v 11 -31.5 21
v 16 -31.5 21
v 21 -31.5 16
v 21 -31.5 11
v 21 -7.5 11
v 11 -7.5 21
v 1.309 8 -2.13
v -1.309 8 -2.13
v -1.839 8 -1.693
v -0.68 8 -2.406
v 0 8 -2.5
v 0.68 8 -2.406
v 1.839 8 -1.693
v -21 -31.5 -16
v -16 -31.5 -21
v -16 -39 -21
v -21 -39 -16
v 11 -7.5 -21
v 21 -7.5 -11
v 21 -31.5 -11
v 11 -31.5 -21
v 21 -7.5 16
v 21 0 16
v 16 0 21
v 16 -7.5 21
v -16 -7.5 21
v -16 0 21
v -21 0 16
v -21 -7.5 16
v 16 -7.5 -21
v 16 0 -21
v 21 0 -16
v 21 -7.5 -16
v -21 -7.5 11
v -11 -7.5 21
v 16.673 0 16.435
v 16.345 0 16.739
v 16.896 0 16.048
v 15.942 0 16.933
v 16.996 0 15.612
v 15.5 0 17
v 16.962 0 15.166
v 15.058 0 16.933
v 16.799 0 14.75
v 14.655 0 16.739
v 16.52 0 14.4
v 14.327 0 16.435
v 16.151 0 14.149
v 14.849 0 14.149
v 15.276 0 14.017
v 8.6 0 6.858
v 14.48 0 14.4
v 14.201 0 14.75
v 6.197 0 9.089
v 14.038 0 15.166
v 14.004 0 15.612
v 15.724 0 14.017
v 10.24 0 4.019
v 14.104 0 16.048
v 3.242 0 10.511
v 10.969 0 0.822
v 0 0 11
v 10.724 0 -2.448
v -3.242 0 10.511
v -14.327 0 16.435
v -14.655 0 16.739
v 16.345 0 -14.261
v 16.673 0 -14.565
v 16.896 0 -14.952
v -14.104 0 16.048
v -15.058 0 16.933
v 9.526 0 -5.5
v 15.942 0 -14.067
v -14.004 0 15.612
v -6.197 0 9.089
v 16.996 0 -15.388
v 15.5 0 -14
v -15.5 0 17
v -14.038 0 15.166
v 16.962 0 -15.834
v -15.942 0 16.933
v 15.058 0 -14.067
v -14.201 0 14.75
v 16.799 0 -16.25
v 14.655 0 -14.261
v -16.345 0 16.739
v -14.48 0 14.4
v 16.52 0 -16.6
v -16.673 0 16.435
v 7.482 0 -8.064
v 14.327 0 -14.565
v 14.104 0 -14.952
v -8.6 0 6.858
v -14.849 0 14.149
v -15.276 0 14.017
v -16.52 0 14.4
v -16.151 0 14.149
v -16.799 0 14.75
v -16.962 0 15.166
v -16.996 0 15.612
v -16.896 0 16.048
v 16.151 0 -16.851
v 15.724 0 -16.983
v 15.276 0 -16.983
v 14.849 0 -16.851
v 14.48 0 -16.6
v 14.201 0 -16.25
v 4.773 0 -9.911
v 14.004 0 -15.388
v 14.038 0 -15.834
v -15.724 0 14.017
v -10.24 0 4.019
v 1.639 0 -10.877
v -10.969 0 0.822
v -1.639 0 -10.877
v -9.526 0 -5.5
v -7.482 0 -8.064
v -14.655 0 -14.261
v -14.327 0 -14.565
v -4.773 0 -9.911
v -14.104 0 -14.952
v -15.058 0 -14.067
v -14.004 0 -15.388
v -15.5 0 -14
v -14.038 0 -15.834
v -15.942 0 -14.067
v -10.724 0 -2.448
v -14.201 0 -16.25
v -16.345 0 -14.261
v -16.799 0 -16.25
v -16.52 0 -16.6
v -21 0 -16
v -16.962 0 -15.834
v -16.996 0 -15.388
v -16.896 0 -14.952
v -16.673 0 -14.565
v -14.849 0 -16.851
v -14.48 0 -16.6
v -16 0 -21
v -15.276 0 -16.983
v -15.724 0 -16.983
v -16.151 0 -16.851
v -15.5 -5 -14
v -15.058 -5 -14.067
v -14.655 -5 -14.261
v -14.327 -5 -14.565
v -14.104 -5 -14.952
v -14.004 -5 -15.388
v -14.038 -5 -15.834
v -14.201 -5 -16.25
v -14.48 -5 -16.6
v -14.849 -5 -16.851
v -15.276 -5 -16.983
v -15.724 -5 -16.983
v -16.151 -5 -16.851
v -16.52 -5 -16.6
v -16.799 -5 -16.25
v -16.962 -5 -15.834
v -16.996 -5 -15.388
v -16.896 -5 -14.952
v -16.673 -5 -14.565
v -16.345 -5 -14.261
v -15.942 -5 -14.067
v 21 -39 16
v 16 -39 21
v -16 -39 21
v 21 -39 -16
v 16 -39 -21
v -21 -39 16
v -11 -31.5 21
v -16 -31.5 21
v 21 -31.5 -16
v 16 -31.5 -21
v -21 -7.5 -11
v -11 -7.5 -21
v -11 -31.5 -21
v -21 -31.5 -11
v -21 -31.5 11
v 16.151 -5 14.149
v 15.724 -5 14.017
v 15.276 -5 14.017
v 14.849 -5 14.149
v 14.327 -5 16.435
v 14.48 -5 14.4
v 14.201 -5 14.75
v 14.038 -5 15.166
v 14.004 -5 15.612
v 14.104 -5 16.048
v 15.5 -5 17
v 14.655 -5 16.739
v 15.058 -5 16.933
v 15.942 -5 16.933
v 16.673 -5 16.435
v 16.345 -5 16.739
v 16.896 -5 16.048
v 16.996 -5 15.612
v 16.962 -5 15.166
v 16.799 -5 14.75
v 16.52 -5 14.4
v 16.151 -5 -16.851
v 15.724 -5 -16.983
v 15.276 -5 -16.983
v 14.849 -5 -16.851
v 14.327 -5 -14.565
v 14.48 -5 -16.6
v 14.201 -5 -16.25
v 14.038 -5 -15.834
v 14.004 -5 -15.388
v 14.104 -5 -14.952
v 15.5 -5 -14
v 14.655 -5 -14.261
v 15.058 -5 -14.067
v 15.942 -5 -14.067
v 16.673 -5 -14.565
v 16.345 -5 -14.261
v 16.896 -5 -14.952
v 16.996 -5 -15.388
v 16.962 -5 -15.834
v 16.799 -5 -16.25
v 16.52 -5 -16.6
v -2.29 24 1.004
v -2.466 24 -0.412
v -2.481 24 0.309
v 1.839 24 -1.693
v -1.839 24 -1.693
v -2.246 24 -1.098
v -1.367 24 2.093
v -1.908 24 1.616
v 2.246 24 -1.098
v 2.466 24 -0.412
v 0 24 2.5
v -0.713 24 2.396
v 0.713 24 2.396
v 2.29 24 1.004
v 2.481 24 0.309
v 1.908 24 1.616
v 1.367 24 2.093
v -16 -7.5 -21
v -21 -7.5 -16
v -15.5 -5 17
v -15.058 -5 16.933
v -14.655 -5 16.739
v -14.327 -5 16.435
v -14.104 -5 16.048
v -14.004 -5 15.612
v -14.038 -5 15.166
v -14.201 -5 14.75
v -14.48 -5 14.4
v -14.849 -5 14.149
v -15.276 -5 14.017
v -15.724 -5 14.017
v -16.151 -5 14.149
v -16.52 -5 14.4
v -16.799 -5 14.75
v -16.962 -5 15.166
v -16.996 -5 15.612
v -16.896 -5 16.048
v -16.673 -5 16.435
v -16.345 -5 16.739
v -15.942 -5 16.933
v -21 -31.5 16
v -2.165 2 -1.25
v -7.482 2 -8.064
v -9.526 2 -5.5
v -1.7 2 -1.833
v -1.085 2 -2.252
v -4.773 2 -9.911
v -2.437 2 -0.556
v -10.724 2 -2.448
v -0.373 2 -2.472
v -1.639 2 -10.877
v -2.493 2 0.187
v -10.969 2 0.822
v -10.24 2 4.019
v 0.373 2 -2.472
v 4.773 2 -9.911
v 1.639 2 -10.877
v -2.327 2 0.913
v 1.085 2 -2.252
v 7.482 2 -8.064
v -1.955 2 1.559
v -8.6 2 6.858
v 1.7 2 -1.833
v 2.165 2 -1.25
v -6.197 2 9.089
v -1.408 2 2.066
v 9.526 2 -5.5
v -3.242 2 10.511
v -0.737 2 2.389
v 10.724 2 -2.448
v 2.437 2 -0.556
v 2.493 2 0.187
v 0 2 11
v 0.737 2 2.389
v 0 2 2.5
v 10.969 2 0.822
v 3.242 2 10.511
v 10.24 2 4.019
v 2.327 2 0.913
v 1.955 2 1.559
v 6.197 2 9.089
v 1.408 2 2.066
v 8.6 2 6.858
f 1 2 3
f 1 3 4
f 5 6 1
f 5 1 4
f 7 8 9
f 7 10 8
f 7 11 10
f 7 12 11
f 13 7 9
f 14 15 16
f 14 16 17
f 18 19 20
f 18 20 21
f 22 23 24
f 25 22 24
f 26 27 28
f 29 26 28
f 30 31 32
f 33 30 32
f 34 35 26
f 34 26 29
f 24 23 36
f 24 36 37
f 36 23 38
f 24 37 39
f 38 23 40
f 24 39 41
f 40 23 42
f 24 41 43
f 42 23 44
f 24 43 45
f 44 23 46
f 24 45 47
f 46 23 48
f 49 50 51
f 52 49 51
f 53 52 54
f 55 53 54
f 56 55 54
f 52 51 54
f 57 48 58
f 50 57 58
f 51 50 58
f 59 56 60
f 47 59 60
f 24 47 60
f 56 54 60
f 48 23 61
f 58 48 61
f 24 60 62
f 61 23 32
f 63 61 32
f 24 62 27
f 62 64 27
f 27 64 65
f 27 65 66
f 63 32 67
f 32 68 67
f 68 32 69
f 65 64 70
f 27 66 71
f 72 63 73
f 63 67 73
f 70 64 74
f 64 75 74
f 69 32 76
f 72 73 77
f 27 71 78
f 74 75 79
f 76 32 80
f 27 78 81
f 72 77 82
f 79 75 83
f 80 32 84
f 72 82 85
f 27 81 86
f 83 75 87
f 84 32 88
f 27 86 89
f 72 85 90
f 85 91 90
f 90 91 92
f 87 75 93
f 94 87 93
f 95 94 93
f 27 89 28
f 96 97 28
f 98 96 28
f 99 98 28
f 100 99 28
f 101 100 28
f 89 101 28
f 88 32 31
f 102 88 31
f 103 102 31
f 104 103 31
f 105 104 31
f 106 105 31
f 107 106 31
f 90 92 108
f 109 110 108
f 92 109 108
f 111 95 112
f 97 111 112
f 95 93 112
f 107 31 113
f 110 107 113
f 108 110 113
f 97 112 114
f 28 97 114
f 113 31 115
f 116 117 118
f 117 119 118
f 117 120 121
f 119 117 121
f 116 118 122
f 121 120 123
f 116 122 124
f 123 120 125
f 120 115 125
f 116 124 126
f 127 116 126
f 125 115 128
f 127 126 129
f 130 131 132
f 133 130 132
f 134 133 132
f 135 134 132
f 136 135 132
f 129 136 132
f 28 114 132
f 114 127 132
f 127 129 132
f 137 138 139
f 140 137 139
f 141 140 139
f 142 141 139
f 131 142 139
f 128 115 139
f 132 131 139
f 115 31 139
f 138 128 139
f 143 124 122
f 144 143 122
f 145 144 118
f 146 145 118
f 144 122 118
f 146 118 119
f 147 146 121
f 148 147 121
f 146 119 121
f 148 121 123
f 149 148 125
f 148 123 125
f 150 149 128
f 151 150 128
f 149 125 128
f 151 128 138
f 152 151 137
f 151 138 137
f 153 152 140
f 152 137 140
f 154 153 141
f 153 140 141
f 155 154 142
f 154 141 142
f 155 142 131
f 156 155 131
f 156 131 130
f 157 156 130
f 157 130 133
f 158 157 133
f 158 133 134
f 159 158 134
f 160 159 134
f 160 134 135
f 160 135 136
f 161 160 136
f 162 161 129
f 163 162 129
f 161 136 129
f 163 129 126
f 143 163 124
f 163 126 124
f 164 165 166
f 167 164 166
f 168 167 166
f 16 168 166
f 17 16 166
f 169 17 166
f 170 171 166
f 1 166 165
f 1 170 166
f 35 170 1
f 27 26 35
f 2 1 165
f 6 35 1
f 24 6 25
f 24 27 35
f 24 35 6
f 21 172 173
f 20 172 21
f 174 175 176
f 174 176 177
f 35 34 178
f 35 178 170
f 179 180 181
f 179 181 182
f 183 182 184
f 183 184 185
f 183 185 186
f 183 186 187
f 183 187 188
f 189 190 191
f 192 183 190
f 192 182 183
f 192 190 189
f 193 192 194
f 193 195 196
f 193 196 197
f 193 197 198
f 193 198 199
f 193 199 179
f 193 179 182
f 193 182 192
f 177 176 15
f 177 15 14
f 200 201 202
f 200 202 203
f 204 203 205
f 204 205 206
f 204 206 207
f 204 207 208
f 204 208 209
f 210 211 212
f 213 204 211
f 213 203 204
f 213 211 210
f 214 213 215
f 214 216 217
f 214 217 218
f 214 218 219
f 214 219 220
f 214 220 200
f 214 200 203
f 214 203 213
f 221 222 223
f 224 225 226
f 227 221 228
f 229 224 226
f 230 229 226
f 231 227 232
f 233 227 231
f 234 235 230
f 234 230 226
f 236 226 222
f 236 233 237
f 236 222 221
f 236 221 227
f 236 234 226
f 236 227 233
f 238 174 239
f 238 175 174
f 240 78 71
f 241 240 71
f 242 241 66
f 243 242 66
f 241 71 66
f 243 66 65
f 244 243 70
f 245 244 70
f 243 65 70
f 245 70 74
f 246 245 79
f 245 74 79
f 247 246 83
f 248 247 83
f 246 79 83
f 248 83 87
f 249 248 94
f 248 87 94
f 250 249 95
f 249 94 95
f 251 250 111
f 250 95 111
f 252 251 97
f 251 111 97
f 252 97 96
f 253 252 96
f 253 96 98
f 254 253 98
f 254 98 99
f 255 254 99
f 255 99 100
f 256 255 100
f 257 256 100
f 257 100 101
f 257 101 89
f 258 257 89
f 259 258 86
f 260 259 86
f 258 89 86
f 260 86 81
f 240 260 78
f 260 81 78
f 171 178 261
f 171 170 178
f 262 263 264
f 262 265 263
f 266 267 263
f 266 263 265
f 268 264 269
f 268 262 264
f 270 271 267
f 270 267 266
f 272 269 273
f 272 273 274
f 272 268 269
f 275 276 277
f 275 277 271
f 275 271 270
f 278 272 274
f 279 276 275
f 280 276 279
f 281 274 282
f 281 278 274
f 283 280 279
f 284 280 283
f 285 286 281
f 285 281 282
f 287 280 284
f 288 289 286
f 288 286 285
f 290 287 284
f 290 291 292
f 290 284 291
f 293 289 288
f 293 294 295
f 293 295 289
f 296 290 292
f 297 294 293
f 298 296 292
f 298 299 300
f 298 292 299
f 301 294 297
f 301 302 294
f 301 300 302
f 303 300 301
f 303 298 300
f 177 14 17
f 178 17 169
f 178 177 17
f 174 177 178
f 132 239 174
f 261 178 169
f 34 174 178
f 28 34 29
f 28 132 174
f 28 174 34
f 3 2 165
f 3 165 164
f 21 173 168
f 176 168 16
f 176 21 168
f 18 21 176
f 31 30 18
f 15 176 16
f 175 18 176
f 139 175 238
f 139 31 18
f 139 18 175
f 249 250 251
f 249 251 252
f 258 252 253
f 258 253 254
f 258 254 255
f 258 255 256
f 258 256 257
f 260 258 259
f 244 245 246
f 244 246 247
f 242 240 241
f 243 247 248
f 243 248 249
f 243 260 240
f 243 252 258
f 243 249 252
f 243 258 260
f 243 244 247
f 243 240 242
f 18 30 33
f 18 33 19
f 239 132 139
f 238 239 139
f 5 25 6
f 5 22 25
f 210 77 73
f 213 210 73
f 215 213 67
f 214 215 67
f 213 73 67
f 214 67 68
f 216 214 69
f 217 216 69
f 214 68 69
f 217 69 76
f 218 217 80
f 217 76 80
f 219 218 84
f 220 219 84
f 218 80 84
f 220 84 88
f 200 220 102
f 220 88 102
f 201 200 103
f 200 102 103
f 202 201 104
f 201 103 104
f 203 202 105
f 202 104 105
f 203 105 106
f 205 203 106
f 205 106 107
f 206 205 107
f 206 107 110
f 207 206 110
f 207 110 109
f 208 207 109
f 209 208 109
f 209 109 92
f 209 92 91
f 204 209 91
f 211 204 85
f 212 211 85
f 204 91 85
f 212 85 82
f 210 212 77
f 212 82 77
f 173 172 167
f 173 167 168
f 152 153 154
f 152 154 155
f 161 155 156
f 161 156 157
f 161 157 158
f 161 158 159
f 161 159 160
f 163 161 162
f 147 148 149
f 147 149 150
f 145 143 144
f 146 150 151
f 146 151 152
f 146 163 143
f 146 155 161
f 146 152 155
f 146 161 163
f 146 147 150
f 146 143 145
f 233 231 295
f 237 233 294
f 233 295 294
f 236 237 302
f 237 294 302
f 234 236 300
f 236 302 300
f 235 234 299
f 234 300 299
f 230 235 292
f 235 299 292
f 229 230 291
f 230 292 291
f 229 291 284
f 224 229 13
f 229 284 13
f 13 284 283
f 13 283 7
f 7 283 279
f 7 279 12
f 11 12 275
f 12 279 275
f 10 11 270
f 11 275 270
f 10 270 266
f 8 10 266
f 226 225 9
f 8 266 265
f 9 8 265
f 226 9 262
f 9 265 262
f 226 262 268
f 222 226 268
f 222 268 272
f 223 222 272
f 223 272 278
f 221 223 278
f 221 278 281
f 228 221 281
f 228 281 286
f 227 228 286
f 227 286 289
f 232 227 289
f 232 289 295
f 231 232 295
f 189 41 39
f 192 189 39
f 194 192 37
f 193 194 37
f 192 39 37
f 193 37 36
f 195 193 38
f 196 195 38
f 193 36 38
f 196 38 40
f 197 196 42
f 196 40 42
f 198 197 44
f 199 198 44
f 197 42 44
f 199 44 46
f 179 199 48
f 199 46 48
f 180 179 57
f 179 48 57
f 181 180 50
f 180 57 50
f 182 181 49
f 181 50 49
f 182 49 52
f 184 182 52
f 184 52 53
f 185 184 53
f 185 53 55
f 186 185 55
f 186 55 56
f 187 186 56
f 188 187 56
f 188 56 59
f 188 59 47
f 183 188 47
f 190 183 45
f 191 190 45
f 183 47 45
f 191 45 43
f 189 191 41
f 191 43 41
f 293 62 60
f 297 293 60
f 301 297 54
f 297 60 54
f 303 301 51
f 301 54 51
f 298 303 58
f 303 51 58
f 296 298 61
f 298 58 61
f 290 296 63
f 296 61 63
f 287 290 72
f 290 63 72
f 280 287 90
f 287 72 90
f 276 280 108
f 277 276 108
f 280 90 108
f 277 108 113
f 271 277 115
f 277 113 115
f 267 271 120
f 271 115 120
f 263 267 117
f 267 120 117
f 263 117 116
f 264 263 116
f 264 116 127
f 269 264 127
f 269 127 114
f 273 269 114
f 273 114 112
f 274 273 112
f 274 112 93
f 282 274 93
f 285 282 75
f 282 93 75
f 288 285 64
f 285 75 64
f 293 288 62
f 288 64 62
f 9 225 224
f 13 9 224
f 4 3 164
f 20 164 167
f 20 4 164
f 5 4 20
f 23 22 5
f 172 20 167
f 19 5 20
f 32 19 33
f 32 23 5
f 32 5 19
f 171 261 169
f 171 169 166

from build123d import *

# Parameters (mm, degrees)
EXTRUDE_1_DEPTH     = 7.5
EXTRUDE_2_DEPTH     = 24
EXTRUDE_3_DEPTH     = 7.5
SKETCH_4_R          = 11
EXTRUDE_4_DEPTH     = 2
SKETCH_5_R          = 2.5
EXTRUDE_5_DEPTH     = 22
SKETCH_6_W          = 7.205665958
SKETCH_6_H          = 1.954366946
CUT_EXTRUDE_1_DEPTH = 16
SKETCH_7_R          = 1.5
CUT_EXTRUDE_2_DEPTH = 5


with BuildPart() as part:
    # 草图1 → 凸台-拉伸1 (new body)
    with BuildSketch(Plane(origin=(0, 0, 0), x_dir=(1, 0, 0), z_dir=(0, 1, 0))):
        Polygon((-21, 16), (-16, 21), (16, 21), (21, 16), (21, -16), (16, -21), (-16, -21), (-21, -16), align=None)
    extrude(amount=-EXTRUDE_1_DEPTH)

    # 草图2 → 凸台-拉伸2 (add)
    with BuildSketch(Plane.XZ.offset(7.5)):
        Polygon((-21, 11), (-11, 21), (11, 21), (21, 11), (21, -11), (11, -21), (-11, -21), (-21, -11), align=None)
    extrude(amount=EXTRUDE_2_DEPTH)

    # 草图3 → 凸台-拉伸3 (add)
    with BuildSketch(Plane.XZ.offset(31.5)):
        Polygon((-21, 16), (-16, 21), (16, 21), (21, 16), (21, -16), (16, -21), (-16, -21), (-21, -16), align=None)
    extrude(amount=EXTRUDE_3_DEPTH)

    # 草图4 → 凸台-拉伸4 (add)
    with BuildSketch(Plane(origin=(0, 0, 0), x_dir=(1, 0, 0), z_dir=(0, 1, 0))):
        with Locations(Location((0, 0, 0), (0, 0, 270))):
            Circle(SKETCH_4_R)
    extrude(amount=EXTRUDE_4_DEPTH)

    # 草图5 → 凸台-拉伸5 (add)
    with BuildSketch(Plane(origin=(0, 2, 0), x_dir=(1, 0, 0), z_dir=(0, 1, 0))):
        with Locations(Location((0, 0, 0), (0, 0, 270))):
            Circle(SKETCH_5_R)
    extrude(amount=EXTRUDE_5_DEPTH)

    # 草图6 → 切除-拉伸1 (cut)
    with BuildSketch(Plane(origin=(0, 24, 0), x_dir=(1, 0, 0), z_dir=(0, 1, 0))):
        with Locations((0.108418899, 2.670655674)):
            Rectangle(SKETCH_6_W, SKETCH_6_H)
    extrude(amount=-CUT_EXTRUDE_1_DEPTH, mode=Mode.SUBTRACT)

    # 草图7 → 切除-拉伸2 (cut)
    with BuildSketch(Plane(origin=(0, 0, 0), x_dir=(1, 0, 0), z_dir=(0, 1, 0))):
        with Locations(Location((-15.5, 15.5, 0), (0, 0, 270))):
            Circle(SKETCH_7_R)
        with Locations(Location((15.5, 15.5, 0), (0, 0, 270))):
            Circle(SKETCH_7_R)
        with Locations(Location((15.5, -15.5, 0), (0, 0, 270))):
            Circle(SKETCH_7_R)
        with Locations(Location((-15.5, -15.5, 0), (0, 0, 270))):
            Circle(SKETCH_7_R)
    extrude(amount=-CUT_EXTRUDE_2_DEPTH, mode=Mode.SUBTRACT)


solid = part.part
